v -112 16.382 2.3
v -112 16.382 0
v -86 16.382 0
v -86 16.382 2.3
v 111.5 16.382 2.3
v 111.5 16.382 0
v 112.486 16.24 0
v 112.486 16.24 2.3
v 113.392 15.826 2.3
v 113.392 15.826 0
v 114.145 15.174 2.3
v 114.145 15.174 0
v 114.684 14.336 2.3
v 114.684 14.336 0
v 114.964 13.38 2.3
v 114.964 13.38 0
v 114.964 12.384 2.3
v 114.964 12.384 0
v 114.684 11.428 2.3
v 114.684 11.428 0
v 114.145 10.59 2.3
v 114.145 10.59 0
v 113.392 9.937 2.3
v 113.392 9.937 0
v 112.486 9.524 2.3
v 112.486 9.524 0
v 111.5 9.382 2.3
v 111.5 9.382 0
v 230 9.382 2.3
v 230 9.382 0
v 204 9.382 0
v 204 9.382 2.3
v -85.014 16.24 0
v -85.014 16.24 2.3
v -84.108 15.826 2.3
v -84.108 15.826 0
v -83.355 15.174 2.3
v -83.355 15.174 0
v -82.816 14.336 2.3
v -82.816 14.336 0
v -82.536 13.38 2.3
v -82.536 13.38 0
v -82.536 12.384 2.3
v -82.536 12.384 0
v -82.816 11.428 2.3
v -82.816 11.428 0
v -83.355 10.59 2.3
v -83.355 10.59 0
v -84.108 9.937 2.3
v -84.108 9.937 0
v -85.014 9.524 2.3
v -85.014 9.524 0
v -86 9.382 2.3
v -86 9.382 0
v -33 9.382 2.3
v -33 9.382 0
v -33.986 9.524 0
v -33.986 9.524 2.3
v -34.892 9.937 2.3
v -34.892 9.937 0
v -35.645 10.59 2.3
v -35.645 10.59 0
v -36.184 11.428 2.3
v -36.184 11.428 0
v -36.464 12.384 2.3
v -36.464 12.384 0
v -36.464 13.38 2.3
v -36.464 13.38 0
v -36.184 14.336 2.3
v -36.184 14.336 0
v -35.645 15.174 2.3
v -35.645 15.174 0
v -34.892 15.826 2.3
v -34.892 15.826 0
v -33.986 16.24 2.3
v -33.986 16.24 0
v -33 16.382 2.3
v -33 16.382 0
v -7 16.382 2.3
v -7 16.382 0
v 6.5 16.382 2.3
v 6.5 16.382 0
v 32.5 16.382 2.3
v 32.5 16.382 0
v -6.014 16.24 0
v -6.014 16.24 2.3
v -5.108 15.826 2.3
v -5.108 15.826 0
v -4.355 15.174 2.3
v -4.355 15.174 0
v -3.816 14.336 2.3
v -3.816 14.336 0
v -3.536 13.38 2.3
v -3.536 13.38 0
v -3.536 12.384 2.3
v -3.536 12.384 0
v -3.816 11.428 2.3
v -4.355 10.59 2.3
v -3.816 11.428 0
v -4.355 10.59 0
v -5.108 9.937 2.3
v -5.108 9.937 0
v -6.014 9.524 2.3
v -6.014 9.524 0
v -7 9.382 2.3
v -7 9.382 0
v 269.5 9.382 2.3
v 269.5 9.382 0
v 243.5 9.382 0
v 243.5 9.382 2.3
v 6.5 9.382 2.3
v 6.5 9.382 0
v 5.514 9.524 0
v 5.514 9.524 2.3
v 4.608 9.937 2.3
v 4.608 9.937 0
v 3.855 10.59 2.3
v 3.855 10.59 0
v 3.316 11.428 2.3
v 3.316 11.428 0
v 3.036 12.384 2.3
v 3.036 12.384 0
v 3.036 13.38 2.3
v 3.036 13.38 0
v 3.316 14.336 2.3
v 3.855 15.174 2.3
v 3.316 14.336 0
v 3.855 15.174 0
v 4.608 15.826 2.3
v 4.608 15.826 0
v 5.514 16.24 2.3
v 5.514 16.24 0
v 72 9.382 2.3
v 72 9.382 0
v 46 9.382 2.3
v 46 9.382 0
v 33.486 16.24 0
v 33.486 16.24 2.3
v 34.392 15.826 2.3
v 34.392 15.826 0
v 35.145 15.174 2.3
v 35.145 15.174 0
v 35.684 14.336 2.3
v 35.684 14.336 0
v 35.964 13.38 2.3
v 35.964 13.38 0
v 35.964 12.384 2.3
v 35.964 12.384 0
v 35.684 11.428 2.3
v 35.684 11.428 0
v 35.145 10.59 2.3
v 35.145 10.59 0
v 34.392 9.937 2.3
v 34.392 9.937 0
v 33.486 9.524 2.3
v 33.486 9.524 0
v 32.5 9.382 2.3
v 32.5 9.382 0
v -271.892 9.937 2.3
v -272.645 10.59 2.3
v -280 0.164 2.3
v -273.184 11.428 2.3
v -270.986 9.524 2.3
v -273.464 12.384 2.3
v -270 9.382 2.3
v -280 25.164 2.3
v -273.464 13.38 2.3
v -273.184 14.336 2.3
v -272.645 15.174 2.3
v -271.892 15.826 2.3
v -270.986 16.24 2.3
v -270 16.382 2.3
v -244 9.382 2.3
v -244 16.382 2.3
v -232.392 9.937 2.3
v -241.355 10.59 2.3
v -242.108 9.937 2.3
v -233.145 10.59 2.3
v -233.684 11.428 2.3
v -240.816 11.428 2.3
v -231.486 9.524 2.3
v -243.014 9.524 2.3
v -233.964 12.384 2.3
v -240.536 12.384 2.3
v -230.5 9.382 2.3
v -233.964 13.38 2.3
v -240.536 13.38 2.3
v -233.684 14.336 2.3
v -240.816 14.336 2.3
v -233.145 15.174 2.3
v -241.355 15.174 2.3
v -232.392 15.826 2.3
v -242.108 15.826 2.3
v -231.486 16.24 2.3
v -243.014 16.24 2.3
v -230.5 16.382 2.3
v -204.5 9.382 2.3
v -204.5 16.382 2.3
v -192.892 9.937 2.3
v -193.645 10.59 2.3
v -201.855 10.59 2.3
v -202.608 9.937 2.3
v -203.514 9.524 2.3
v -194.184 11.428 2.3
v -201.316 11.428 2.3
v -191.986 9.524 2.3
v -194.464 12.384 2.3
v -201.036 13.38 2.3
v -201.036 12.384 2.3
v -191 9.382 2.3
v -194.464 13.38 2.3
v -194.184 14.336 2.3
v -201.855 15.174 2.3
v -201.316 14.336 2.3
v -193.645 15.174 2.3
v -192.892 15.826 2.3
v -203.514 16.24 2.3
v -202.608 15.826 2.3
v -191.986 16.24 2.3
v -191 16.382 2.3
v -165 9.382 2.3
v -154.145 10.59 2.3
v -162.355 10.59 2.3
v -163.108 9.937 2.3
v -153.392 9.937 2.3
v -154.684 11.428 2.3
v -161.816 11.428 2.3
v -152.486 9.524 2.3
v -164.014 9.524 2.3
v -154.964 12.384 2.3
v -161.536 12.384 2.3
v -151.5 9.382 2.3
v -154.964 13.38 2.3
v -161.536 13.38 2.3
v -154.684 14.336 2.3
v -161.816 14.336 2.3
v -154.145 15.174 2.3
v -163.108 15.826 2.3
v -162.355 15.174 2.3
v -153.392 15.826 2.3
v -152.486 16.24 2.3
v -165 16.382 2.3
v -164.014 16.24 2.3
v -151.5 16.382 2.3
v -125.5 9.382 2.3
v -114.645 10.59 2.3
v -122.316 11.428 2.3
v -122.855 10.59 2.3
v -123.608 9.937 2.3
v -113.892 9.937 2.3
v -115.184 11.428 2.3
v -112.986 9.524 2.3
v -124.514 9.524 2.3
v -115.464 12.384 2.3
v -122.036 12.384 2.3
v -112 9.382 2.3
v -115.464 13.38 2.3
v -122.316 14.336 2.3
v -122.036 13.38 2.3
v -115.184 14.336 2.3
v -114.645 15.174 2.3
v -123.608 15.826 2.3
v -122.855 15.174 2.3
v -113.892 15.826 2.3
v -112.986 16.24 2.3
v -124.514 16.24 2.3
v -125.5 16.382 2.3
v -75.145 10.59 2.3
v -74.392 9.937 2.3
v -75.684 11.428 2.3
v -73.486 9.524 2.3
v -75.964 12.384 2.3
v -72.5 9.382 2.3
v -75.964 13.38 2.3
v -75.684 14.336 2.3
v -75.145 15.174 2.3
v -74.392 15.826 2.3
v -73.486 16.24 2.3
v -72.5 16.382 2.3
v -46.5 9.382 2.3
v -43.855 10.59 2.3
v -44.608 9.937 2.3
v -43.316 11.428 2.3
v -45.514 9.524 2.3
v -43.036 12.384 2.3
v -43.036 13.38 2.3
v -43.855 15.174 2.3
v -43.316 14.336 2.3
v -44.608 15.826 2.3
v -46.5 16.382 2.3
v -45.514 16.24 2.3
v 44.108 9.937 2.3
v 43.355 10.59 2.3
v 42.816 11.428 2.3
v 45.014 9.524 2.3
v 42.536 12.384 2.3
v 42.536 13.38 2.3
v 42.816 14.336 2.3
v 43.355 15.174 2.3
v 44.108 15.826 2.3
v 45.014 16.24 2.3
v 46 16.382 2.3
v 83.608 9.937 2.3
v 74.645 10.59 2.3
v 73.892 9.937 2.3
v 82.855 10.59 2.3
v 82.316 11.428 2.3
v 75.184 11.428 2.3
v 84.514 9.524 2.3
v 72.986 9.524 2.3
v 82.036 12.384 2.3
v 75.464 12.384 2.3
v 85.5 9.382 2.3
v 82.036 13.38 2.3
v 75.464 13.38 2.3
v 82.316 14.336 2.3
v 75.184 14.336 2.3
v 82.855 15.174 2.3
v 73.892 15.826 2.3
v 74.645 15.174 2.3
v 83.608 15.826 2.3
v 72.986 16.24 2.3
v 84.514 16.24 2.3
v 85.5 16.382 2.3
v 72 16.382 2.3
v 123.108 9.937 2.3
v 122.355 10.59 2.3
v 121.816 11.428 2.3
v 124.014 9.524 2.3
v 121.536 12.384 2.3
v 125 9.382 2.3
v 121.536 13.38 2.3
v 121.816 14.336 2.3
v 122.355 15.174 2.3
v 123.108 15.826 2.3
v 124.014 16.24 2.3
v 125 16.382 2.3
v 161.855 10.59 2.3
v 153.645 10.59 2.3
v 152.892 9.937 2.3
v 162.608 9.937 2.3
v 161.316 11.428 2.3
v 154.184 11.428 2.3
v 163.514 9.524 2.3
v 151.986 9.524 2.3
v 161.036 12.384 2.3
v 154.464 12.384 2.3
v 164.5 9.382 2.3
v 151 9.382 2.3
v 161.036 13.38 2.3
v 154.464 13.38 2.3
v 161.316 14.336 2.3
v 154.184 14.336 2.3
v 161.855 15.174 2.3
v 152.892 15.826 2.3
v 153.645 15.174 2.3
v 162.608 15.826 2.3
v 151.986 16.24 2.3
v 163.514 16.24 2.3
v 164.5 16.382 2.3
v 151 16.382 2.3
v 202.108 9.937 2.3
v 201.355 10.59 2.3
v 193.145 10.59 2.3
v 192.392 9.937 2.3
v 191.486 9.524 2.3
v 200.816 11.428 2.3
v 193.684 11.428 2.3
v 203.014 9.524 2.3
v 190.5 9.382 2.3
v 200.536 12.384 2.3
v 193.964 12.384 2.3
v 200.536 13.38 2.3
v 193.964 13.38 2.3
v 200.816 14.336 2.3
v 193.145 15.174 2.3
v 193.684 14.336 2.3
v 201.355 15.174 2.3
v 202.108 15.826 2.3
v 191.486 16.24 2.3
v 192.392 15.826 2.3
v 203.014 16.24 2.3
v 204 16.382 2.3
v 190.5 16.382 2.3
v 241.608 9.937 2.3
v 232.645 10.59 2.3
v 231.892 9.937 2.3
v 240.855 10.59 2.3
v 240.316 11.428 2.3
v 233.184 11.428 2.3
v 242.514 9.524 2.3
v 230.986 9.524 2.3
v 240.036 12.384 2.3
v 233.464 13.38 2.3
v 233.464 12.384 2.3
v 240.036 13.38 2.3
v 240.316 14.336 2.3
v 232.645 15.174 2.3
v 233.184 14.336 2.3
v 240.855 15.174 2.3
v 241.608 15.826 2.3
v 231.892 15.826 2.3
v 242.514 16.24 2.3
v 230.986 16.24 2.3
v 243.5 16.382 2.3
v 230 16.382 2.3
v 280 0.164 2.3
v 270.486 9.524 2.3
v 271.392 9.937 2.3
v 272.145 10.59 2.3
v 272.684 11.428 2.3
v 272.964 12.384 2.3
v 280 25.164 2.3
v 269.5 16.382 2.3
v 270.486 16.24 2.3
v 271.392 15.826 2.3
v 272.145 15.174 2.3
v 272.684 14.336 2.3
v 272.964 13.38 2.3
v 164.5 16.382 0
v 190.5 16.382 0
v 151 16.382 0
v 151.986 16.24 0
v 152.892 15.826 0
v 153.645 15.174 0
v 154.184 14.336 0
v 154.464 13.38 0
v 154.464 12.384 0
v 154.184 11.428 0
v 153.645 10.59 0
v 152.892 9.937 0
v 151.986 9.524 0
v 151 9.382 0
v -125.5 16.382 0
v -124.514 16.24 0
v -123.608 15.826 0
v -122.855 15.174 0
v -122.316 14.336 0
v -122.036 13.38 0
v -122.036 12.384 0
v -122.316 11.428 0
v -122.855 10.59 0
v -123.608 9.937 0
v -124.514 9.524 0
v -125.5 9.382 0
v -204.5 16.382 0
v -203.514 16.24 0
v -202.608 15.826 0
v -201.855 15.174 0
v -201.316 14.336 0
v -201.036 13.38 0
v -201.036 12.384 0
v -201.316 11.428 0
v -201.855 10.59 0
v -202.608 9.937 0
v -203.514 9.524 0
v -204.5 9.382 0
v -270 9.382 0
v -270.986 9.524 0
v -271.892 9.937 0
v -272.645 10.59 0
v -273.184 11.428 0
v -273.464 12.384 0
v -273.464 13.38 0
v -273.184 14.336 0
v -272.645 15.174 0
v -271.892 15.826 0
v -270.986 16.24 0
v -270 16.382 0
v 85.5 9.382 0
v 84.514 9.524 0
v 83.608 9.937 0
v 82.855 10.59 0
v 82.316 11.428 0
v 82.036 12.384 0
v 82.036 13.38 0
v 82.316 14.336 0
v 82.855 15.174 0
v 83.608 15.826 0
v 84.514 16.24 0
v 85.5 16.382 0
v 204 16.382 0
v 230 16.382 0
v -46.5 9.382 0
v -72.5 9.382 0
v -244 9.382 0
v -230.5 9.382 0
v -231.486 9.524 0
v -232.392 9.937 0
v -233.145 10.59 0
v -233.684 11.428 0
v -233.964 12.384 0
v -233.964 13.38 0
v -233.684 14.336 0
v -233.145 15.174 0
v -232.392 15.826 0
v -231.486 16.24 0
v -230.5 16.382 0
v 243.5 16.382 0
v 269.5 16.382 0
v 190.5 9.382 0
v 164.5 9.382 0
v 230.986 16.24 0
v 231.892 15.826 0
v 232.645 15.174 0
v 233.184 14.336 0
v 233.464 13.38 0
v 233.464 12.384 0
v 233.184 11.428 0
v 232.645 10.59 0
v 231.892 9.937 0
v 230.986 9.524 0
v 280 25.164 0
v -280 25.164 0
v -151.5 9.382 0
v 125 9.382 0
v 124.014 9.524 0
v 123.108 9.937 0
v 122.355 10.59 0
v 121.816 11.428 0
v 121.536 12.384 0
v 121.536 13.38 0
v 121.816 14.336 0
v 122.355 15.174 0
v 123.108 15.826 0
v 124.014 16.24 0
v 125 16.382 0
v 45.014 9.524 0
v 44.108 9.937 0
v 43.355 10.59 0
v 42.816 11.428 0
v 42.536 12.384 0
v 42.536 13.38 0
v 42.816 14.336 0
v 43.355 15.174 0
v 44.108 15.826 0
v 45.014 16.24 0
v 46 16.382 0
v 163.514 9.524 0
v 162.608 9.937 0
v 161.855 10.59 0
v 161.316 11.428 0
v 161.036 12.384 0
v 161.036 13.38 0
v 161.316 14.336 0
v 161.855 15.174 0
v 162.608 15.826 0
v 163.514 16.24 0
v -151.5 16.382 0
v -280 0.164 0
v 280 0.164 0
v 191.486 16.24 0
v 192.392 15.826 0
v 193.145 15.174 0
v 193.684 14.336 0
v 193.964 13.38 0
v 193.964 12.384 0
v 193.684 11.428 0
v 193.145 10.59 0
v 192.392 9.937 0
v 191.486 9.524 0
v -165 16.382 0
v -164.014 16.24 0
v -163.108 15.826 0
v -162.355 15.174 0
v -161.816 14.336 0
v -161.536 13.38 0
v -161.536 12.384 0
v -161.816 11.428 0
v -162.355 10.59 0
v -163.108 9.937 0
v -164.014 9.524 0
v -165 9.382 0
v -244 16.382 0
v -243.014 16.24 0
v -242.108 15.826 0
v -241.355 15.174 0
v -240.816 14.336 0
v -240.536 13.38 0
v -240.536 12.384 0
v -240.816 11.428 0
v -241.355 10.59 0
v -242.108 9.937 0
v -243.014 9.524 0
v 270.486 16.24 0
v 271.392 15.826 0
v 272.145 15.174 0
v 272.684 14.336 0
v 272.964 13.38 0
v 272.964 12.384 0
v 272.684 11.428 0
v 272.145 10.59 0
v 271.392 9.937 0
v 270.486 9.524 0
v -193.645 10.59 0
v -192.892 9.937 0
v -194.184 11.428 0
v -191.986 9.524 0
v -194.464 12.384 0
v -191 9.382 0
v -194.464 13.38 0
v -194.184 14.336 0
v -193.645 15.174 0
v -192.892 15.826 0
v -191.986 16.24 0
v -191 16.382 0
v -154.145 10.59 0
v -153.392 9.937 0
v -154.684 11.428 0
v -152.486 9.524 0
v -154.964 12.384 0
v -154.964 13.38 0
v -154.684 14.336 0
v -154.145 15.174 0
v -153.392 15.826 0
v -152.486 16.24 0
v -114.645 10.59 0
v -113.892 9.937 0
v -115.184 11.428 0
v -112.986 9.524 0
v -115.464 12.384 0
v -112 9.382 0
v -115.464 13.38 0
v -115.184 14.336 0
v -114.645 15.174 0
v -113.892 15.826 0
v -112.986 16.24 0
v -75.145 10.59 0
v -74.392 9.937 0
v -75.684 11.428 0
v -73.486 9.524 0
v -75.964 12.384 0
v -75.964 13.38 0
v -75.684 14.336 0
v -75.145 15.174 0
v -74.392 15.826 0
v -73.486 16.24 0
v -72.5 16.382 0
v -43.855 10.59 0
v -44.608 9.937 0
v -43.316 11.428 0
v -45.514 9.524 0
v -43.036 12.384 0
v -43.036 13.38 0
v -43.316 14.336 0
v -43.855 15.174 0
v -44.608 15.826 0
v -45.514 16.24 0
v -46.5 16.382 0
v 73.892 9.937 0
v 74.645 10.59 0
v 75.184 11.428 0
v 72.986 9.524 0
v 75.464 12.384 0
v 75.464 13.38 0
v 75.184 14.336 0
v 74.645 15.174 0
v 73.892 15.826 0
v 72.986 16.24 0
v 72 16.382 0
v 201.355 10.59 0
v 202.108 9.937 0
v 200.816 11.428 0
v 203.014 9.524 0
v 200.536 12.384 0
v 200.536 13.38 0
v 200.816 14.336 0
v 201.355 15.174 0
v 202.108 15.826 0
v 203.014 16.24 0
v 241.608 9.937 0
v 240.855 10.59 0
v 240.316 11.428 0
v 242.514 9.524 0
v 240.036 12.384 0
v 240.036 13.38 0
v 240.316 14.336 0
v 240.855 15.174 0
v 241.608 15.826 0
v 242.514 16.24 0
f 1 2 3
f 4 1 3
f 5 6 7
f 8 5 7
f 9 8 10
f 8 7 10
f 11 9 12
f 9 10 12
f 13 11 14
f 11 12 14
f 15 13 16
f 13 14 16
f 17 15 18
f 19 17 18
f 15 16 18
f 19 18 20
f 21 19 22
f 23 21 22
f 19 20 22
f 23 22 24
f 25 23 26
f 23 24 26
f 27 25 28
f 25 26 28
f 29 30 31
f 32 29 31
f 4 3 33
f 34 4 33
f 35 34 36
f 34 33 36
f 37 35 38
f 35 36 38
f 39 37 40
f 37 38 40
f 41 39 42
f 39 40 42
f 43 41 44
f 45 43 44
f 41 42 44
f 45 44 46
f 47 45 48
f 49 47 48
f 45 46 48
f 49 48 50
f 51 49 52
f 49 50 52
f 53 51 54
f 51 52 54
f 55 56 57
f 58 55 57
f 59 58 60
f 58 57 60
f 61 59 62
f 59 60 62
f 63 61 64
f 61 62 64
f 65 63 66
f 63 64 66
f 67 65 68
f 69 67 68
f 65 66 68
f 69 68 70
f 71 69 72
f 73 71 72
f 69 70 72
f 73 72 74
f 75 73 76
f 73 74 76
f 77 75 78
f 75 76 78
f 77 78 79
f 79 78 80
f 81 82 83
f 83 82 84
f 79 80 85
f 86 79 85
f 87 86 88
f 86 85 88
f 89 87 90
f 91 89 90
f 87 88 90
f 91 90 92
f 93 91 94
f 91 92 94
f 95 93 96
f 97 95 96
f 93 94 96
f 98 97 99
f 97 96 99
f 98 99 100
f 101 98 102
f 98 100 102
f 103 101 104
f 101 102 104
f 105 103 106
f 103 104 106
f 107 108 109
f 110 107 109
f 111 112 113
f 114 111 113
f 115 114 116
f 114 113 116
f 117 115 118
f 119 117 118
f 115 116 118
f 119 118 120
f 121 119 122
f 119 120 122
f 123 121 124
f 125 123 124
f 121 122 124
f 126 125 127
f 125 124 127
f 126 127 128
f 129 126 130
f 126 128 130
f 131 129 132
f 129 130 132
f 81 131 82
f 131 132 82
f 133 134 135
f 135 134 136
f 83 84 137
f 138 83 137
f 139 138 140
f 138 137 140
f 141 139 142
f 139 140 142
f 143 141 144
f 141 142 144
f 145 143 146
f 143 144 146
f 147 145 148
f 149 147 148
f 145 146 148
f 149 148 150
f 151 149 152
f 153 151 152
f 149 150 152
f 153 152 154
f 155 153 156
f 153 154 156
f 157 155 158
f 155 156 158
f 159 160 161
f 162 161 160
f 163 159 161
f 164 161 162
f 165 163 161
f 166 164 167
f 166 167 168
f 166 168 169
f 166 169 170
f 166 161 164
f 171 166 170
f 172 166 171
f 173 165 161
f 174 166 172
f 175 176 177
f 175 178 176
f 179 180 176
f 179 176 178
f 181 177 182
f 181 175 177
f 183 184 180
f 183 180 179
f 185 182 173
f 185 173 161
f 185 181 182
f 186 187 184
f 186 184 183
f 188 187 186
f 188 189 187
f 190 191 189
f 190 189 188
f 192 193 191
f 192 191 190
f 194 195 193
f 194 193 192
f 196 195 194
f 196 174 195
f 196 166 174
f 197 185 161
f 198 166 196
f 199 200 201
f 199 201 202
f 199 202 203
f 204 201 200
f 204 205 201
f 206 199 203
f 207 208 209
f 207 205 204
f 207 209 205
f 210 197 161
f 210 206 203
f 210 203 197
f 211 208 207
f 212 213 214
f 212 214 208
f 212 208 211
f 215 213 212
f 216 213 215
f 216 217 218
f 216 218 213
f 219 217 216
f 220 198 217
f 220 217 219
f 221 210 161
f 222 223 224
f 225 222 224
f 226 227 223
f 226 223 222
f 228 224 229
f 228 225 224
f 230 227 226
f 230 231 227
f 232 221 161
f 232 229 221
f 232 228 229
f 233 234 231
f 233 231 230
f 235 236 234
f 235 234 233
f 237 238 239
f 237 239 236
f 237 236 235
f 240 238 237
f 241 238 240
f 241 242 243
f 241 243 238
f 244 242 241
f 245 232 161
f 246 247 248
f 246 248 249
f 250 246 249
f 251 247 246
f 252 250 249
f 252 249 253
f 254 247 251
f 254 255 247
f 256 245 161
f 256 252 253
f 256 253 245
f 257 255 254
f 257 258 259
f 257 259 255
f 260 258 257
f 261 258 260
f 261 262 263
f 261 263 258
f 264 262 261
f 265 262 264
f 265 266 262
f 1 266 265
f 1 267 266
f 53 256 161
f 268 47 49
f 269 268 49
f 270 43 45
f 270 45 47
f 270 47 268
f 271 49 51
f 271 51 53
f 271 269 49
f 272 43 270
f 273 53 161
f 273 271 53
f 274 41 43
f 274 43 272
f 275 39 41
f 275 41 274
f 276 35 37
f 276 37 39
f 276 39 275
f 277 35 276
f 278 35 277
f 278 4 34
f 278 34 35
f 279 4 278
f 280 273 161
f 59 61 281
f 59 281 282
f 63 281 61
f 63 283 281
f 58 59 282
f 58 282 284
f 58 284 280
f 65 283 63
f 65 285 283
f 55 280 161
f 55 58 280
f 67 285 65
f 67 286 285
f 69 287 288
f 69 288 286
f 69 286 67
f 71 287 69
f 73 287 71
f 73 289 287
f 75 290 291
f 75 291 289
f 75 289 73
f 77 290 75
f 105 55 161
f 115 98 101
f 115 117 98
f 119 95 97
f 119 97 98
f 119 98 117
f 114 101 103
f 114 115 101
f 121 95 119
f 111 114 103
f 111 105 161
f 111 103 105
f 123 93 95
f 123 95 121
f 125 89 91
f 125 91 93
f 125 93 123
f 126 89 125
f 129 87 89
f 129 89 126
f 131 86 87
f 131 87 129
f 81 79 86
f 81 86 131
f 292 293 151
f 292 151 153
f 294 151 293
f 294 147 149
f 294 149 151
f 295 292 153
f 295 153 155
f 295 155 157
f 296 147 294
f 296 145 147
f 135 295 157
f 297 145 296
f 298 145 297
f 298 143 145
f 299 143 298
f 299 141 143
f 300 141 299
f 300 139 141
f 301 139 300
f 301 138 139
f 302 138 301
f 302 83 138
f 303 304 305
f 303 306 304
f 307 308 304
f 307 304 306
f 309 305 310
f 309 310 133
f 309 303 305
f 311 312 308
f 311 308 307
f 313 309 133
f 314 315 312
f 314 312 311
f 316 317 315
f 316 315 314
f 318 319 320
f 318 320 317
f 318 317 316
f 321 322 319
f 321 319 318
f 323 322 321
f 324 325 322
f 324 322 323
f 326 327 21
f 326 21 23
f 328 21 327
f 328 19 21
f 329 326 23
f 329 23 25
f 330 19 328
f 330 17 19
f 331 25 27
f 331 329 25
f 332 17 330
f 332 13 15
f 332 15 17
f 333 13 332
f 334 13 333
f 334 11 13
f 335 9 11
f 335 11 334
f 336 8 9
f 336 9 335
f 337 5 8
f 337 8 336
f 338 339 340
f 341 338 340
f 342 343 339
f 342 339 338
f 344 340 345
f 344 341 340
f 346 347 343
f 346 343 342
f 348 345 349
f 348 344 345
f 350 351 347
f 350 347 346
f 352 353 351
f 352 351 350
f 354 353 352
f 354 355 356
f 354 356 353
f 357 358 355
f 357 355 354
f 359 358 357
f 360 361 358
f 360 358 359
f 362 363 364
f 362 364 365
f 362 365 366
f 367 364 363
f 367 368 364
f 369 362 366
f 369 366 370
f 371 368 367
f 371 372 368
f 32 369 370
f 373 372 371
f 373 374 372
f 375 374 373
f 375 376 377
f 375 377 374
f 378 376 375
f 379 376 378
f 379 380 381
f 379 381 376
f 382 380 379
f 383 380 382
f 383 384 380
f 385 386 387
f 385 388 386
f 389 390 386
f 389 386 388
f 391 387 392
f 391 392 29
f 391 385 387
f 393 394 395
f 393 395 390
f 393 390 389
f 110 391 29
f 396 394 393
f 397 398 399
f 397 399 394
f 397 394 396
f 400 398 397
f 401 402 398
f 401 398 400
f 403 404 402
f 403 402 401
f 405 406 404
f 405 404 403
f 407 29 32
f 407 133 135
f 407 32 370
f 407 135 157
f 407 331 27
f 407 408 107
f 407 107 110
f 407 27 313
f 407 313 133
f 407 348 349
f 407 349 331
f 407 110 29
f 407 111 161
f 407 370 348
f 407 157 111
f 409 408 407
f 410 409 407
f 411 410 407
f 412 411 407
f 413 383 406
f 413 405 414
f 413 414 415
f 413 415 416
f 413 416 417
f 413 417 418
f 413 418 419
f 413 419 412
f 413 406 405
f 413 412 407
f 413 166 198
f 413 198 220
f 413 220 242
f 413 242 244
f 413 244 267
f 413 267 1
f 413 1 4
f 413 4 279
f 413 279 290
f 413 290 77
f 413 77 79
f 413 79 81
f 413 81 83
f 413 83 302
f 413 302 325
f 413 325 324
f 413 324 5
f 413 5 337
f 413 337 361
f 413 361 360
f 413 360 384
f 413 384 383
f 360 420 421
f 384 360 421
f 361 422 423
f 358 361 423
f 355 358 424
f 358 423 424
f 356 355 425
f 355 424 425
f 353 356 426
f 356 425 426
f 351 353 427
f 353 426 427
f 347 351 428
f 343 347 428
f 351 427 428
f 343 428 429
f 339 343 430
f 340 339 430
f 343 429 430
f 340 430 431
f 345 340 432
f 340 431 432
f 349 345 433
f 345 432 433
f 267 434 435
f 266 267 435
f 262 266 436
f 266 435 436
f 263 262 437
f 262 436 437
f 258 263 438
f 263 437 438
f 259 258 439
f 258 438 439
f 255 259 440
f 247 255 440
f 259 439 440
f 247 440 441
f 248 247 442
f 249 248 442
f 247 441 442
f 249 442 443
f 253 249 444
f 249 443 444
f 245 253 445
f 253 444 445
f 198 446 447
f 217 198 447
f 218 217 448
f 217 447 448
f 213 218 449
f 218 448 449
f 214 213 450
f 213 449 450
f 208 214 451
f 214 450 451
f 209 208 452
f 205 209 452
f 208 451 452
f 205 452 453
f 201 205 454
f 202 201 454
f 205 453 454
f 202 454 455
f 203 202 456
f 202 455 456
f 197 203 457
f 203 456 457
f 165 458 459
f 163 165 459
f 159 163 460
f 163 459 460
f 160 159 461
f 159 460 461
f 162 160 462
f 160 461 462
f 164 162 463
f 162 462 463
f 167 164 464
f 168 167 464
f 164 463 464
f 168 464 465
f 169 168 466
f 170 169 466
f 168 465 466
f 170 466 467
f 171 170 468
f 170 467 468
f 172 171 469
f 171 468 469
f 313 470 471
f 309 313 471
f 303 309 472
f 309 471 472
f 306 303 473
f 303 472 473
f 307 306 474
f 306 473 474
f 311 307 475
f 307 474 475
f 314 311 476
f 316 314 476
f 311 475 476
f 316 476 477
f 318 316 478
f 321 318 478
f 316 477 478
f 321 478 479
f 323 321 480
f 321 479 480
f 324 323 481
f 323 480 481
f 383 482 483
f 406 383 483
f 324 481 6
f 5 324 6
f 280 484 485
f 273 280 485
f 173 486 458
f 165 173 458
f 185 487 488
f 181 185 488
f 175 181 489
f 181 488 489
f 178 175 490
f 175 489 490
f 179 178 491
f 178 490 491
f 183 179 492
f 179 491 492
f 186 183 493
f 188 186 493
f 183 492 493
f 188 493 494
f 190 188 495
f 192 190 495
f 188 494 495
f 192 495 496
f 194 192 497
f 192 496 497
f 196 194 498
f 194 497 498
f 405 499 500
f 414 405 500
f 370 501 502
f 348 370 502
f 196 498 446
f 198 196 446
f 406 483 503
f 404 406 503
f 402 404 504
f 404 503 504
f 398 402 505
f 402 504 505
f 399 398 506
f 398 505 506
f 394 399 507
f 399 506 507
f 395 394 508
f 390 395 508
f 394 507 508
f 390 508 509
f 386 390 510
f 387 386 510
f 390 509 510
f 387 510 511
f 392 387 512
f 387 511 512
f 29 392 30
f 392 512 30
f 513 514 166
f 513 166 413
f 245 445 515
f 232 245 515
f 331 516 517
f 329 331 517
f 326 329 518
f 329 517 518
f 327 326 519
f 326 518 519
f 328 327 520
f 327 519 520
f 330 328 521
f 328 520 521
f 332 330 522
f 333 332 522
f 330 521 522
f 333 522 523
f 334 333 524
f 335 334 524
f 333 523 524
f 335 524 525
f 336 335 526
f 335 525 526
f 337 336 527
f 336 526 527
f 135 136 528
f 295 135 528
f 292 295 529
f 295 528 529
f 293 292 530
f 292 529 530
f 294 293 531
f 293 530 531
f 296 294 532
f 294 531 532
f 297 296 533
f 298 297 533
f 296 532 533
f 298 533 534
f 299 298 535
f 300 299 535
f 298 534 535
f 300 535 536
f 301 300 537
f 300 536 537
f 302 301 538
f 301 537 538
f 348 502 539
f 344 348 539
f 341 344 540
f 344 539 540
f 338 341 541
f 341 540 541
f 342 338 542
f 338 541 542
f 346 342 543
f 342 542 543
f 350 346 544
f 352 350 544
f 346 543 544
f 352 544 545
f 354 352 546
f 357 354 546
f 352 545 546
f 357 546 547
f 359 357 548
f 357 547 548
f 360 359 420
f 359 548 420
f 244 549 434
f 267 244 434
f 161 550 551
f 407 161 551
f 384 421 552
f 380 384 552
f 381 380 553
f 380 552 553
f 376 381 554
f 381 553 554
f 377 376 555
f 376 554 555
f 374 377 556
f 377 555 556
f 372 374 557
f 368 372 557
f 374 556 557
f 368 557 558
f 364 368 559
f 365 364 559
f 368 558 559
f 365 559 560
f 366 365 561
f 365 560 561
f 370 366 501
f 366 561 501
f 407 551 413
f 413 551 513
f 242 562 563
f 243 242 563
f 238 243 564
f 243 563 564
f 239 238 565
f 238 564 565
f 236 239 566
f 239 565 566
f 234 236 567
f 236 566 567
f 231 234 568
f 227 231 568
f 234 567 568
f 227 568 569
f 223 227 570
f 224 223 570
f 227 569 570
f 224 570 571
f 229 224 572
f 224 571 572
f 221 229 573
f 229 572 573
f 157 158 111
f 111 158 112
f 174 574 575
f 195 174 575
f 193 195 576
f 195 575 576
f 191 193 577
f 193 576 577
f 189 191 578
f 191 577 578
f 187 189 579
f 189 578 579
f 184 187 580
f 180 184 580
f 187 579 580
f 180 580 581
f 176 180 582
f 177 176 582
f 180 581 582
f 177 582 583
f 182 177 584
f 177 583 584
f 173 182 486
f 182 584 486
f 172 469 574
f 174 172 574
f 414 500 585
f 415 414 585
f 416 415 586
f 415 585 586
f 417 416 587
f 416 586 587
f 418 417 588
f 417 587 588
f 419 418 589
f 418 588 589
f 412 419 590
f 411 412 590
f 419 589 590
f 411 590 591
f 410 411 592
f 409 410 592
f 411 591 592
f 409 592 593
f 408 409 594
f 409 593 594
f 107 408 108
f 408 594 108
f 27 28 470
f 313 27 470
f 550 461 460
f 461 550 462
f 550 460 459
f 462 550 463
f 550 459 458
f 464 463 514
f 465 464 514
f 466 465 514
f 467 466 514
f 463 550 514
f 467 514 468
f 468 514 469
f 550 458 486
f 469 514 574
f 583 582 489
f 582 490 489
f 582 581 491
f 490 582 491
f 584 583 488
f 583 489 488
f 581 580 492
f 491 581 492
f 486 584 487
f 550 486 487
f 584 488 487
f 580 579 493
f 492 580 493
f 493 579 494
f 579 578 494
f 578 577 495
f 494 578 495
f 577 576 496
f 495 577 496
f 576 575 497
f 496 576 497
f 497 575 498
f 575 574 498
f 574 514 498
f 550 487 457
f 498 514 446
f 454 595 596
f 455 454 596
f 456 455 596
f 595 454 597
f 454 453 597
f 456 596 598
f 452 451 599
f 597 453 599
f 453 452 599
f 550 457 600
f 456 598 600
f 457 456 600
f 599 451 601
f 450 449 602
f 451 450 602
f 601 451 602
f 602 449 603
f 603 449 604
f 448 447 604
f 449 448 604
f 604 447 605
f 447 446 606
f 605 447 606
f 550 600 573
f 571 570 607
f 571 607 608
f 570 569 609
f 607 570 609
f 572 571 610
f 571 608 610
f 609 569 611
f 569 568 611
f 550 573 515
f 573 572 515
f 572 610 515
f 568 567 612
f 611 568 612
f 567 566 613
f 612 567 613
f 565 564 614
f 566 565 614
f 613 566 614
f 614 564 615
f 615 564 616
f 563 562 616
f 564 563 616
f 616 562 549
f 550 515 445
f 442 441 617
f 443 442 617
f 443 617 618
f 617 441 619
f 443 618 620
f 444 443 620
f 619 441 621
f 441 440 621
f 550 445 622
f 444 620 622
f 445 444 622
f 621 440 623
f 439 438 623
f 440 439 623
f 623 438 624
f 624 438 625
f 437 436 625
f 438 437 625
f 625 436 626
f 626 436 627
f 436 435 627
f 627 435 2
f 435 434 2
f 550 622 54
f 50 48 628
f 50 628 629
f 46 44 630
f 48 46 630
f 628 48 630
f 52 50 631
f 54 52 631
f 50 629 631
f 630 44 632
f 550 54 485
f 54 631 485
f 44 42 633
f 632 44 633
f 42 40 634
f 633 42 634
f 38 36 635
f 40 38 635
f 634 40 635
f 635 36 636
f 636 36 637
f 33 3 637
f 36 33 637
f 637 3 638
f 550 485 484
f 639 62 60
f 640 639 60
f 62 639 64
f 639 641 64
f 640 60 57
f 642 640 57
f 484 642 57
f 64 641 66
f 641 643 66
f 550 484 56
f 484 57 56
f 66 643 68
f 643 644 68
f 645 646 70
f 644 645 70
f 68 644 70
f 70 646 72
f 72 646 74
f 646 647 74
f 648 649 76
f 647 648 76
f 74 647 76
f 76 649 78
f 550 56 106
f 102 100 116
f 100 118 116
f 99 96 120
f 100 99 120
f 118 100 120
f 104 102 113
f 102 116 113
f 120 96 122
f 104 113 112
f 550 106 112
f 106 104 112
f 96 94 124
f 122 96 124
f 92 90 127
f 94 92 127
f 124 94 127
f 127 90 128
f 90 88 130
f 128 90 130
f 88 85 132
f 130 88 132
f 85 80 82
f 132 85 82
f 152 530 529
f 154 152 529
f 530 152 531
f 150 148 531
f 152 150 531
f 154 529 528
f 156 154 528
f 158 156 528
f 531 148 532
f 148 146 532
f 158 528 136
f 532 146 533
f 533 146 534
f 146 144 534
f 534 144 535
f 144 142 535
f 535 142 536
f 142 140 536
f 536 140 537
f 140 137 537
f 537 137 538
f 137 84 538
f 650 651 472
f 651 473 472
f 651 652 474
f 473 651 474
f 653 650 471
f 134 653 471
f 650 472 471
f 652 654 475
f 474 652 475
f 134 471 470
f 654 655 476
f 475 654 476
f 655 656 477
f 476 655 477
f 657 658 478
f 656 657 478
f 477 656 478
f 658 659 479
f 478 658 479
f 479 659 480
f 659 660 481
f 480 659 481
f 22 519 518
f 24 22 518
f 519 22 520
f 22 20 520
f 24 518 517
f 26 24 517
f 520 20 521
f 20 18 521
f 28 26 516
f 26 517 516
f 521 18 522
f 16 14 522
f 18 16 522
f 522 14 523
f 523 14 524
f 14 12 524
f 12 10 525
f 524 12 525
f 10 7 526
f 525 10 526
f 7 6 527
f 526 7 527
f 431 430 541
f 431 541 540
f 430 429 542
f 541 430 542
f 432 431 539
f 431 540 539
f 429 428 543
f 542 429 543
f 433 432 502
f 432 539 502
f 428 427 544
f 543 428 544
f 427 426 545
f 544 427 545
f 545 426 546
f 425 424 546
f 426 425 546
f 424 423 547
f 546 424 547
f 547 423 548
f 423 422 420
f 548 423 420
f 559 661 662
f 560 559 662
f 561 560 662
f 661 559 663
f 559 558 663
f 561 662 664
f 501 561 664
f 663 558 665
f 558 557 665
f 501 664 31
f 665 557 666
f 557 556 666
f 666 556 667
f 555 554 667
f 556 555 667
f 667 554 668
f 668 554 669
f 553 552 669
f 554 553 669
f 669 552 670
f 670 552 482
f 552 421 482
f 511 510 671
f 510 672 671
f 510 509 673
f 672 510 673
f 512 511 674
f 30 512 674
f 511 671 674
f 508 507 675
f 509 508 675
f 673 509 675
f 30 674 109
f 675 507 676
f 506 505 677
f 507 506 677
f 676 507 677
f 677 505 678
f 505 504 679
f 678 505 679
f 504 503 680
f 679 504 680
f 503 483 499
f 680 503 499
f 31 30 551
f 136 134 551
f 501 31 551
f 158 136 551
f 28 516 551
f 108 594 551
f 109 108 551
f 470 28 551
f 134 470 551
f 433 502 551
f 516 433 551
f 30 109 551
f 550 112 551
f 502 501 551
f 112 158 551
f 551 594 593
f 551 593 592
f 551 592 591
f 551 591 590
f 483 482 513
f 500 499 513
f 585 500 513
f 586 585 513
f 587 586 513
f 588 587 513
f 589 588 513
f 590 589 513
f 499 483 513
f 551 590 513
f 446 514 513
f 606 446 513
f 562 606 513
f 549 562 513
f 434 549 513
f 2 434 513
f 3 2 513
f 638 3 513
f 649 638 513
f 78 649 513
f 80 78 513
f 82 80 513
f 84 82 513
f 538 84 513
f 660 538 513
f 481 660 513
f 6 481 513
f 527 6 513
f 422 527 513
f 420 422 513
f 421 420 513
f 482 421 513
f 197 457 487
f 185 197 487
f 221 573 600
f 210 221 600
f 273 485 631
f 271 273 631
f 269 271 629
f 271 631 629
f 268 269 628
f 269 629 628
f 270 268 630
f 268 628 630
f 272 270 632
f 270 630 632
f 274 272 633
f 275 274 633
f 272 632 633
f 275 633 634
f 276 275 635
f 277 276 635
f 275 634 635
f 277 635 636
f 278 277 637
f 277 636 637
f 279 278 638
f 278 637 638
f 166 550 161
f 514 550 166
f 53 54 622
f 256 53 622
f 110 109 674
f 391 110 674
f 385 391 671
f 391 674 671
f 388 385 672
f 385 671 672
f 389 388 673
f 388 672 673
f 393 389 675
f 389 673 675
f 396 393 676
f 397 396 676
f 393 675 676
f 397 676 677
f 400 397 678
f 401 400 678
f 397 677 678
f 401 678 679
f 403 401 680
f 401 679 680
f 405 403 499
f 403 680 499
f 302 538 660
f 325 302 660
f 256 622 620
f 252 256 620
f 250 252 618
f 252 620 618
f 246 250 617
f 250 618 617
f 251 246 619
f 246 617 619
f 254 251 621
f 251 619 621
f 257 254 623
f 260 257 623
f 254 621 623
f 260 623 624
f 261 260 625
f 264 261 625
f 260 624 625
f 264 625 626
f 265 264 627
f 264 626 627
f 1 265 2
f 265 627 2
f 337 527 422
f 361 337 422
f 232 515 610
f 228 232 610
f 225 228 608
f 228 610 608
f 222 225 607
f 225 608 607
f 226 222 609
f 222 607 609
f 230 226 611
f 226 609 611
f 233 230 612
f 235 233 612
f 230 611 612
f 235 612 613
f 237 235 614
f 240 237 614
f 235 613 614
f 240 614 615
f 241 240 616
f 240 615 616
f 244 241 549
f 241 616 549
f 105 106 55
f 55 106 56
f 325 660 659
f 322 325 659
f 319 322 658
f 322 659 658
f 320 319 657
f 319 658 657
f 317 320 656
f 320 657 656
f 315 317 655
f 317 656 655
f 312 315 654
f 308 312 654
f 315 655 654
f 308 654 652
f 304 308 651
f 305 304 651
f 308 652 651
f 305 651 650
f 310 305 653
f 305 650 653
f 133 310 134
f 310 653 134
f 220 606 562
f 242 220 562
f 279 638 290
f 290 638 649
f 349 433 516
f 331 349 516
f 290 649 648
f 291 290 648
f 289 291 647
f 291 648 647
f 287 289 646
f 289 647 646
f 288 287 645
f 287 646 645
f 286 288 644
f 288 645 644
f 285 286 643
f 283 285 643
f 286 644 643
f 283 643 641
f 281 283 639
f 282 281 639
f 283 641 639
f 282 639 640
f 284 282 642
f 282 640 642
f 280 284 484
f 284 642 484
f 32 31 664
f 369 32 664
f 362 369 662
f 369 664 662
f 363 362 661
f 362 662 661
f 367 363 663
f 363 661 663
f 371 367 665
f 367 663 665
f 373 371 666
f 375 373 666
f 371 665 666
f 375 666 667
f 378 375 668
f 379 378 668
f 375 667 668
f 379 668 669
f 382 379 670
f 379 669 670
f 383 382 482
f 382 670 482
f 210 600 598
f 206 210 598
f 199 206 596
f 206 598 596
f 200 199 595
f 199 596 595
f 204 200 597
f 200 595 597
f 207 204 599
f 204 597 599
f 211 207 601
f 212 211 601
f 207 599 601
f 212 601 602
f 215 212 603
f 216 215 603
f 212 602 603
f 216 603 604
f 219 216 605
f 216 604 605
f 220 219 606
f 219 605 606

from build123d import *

# Parameters (mm, degrees)
SKETCH_1_W      = 560
SKETCH_1_H      = 25
EXTRUDE_1_DEPTH = 2.3


with BuildPart() as part:
    # ｽｹｯﾁ1 → ﾎﾞｽ - 押し出し1 (new body)
    with BuildSketch(Plane.XY):
        with Locations((0, 12.664243194)):
            Rectangle(SKETCH_1_W, SKETCH_1_H)
        with BuildLine():
            Line((-270, 16.381792792), (-244, 16.381792792))
            ThreePointArc((-244, 16.381792792), (-240.5, 12.881792792), (-244, 9.381792792))
            Line((-244, 9.381792792), (-270, 9.381792792))
            ThreePointArc((-270, 9.381792792), (-273.5, 12.881792792), (-270, 16.381792792))
        make_face(mode=Mode.SUBTRACT)
        with BuildLine():
            Line((-230.5, 16.381792792), (-204.5, 16.381792792))
            ThreePointArc((-204.5, 16.381792792), (-201, 12.881792792), (-204.5, 9.381792792))
            Line((-204.5, 9.381792792), (-230.5, 9.381792792))
            ThreePointArc((-230.5, 9.381792792), (-234, 12.881792792), (-230.5, 16.381792792))
        make_face(mode=Mode.SUBTRACT)
        with BuildLine():
            Line((-191, 16.381792792), (-165, 16.381792792))
            ThreePointArc((-165, 16.381792792), (-161.5, 12.881792792), (-165, 9.381792792))
            Line((-165, 9.381792792), (-191, 9.381792792))
            ThreePointArc((-191, 9.381792792), (-194.5, 12.881792792), (-191, 16.381792792))
        make_face(mode=Mode.SUBTRACT)
        with BuildLine():
            Line((-151.5, 16.381792792), (-125.5, 16.381792792))
            ThreePointArc((-125.5, 16.381792792), (-122, 12.881792792), (-125.5, 9.381792792))
            Line((-125.5, 9.381792792), (-151.5, 9.381792792))
            ThreePointArc((-151.5, 9.381792792), (-155, 12.881792792), (-151.5, 16.381792792))
        make_face(mode=Mode.SUBTRACT)
        with BuildLine():
            Line((-112, 16.381792792), (-86, 16.381792792))
            ThreePointArc((-86, 16.381792792), (-82.5, 12.881792792), (-86, 9.381792792))
            Line((-86, 9.381792792), (-112, 9.381792792))
            ThreePointArc((-112, 9.381792792), (-115.5, 12.881792792), (-112, 16.381792792))
        make_face(mode=Mode.SUBTRACT)
        with BuildLine():
            Line((-72.5, 16.381792792), (-46.5, 16.381792792))
            ThreePointArc((-46.5, 16.381792792), (-43, 12.881792792), (-46.5, 9.381792792))
            Line((-46.5, 9.381792792), (-72.5, 9.381792792))
            ThreePointArc((-72.5, 9.381792792), (-76, 12.881792792), (-72.5, 16.381792792))
        make_face(mode=Mode.SUBTRACT)
        with BuildLine():
            Line((-33, 16.381792792), (-7, 16.381792792))
            ThreePointArc((-7, 16.381792792), (-3.5, 12.881792792), (-7, 9.381792792))
            Line((-7, 9.381792792), (-33, 9.381792792))
            ThreePointArc((-33, 9.381792792), (-36.5, 12.881792792), (-33, 16.381792792))
        make_face(mode=Mode.SUBTRACT)
        with BuildLine():
            Line((6.5, 16.381792792), (32.5, 16.381792792))
            ThreePointArc((32.5, 16.381792792), (36, 12.881792792), (32.5, 9.381792792))
            Line((32.5, 9.381792792), (6.5, 9.381792792))
            ThreePointArc((6.5, 9.381792792), (3, 12.881792792), (6.5, 16.381792792))
        make_face(mode=Mode.SUBTRACT)
        with BuildLine():
            Line((46, 16.381792792), (72, 16.381792792))
            ThreePointArc((72, 16.381792792), (75.5, 12.881792792), (72, 9.381792792))
            Line((72, 9.381792792), (46, 9.381792792))
            ThreePointArc((46, 9.381792792), (42.5, 12.881792792), (46, 16.381792792))
        make_face(mode=Mode.SUBTRACT)
        with BuildLine():
            Line((85.5, 16.381792792), (111.5, 16.381792792))
            ThreePointArc((111.5, 16.381792792), (115, 12.881792792), (111.5, 9.381792792))
            Line((111.5, 9.381792792), (85.5, 9.381792792))
            ThreePointArc((85.5, 9.381792792), (82, 12.881792792), (85.5, 16.381792792))
        make_face(mode=Mode.SUBTRACT)
        with BuildLine():
            Line((125, 16.381792792), (151, 16.381792792))
            ThreePointArc((151, 16.381792792), (154.5, 12.881792792), (151, 9.381792792))
            Line((151, 9.381792792), (125, 9.381792792))
            ThreePointArc((125, 9.381792792), (121.5, 12.881792792), (125, 16.381792792))
        make_face(mode=Mode.SUBTRACT)
        with BuildLine():
            Line((164.5, 16.381792792), (190.5, 16.381792792))
            ThreePointArc((190.5, 16.381792792), (194, 12.881792792), (190.5, 9.381792792))
            Line((190.5, 9.381792792), (164.5, 9.381792792))
            ThreePointArc((164.5, 9.381792792), (161, 12.881792792), (164.5, 16.381792792))
        make_face(mode=Mode.SUBTRACT)
        with BuildLine():
            Line((204, 16.381792792), (230, 16.381792792))
            ThreePointArc((230, 16.381792792), (233.5, 12.881792792), (230, 9.381792792))
            Line((230, 9.381792792), (204, 9.381792792))
            ThreePointArc((204, 9.381792792), (200.5, 12.881792792), (204, 16.381792792))
        make_face(mode=Mode.SUBTRACT)
        with BuildLine():
            Line((243.5, 16.381792792), (269.5, 16.381792792))
            ThreePointArc((269.5, 16.381792792), (273, 12.881792792), (269.5, 9.381792792))
            Line((269.5, 9.381792792), (243.5, 9.381792792))
            ThreePointArc((243.5, 9.381792792), (240, 12.881792792), (243.5, 16.381792792))
        make_face(mode=Mode.SUBTRACT)
    extrude(amount=EXTRUDE_1_DEPTH)


solid = part.part
